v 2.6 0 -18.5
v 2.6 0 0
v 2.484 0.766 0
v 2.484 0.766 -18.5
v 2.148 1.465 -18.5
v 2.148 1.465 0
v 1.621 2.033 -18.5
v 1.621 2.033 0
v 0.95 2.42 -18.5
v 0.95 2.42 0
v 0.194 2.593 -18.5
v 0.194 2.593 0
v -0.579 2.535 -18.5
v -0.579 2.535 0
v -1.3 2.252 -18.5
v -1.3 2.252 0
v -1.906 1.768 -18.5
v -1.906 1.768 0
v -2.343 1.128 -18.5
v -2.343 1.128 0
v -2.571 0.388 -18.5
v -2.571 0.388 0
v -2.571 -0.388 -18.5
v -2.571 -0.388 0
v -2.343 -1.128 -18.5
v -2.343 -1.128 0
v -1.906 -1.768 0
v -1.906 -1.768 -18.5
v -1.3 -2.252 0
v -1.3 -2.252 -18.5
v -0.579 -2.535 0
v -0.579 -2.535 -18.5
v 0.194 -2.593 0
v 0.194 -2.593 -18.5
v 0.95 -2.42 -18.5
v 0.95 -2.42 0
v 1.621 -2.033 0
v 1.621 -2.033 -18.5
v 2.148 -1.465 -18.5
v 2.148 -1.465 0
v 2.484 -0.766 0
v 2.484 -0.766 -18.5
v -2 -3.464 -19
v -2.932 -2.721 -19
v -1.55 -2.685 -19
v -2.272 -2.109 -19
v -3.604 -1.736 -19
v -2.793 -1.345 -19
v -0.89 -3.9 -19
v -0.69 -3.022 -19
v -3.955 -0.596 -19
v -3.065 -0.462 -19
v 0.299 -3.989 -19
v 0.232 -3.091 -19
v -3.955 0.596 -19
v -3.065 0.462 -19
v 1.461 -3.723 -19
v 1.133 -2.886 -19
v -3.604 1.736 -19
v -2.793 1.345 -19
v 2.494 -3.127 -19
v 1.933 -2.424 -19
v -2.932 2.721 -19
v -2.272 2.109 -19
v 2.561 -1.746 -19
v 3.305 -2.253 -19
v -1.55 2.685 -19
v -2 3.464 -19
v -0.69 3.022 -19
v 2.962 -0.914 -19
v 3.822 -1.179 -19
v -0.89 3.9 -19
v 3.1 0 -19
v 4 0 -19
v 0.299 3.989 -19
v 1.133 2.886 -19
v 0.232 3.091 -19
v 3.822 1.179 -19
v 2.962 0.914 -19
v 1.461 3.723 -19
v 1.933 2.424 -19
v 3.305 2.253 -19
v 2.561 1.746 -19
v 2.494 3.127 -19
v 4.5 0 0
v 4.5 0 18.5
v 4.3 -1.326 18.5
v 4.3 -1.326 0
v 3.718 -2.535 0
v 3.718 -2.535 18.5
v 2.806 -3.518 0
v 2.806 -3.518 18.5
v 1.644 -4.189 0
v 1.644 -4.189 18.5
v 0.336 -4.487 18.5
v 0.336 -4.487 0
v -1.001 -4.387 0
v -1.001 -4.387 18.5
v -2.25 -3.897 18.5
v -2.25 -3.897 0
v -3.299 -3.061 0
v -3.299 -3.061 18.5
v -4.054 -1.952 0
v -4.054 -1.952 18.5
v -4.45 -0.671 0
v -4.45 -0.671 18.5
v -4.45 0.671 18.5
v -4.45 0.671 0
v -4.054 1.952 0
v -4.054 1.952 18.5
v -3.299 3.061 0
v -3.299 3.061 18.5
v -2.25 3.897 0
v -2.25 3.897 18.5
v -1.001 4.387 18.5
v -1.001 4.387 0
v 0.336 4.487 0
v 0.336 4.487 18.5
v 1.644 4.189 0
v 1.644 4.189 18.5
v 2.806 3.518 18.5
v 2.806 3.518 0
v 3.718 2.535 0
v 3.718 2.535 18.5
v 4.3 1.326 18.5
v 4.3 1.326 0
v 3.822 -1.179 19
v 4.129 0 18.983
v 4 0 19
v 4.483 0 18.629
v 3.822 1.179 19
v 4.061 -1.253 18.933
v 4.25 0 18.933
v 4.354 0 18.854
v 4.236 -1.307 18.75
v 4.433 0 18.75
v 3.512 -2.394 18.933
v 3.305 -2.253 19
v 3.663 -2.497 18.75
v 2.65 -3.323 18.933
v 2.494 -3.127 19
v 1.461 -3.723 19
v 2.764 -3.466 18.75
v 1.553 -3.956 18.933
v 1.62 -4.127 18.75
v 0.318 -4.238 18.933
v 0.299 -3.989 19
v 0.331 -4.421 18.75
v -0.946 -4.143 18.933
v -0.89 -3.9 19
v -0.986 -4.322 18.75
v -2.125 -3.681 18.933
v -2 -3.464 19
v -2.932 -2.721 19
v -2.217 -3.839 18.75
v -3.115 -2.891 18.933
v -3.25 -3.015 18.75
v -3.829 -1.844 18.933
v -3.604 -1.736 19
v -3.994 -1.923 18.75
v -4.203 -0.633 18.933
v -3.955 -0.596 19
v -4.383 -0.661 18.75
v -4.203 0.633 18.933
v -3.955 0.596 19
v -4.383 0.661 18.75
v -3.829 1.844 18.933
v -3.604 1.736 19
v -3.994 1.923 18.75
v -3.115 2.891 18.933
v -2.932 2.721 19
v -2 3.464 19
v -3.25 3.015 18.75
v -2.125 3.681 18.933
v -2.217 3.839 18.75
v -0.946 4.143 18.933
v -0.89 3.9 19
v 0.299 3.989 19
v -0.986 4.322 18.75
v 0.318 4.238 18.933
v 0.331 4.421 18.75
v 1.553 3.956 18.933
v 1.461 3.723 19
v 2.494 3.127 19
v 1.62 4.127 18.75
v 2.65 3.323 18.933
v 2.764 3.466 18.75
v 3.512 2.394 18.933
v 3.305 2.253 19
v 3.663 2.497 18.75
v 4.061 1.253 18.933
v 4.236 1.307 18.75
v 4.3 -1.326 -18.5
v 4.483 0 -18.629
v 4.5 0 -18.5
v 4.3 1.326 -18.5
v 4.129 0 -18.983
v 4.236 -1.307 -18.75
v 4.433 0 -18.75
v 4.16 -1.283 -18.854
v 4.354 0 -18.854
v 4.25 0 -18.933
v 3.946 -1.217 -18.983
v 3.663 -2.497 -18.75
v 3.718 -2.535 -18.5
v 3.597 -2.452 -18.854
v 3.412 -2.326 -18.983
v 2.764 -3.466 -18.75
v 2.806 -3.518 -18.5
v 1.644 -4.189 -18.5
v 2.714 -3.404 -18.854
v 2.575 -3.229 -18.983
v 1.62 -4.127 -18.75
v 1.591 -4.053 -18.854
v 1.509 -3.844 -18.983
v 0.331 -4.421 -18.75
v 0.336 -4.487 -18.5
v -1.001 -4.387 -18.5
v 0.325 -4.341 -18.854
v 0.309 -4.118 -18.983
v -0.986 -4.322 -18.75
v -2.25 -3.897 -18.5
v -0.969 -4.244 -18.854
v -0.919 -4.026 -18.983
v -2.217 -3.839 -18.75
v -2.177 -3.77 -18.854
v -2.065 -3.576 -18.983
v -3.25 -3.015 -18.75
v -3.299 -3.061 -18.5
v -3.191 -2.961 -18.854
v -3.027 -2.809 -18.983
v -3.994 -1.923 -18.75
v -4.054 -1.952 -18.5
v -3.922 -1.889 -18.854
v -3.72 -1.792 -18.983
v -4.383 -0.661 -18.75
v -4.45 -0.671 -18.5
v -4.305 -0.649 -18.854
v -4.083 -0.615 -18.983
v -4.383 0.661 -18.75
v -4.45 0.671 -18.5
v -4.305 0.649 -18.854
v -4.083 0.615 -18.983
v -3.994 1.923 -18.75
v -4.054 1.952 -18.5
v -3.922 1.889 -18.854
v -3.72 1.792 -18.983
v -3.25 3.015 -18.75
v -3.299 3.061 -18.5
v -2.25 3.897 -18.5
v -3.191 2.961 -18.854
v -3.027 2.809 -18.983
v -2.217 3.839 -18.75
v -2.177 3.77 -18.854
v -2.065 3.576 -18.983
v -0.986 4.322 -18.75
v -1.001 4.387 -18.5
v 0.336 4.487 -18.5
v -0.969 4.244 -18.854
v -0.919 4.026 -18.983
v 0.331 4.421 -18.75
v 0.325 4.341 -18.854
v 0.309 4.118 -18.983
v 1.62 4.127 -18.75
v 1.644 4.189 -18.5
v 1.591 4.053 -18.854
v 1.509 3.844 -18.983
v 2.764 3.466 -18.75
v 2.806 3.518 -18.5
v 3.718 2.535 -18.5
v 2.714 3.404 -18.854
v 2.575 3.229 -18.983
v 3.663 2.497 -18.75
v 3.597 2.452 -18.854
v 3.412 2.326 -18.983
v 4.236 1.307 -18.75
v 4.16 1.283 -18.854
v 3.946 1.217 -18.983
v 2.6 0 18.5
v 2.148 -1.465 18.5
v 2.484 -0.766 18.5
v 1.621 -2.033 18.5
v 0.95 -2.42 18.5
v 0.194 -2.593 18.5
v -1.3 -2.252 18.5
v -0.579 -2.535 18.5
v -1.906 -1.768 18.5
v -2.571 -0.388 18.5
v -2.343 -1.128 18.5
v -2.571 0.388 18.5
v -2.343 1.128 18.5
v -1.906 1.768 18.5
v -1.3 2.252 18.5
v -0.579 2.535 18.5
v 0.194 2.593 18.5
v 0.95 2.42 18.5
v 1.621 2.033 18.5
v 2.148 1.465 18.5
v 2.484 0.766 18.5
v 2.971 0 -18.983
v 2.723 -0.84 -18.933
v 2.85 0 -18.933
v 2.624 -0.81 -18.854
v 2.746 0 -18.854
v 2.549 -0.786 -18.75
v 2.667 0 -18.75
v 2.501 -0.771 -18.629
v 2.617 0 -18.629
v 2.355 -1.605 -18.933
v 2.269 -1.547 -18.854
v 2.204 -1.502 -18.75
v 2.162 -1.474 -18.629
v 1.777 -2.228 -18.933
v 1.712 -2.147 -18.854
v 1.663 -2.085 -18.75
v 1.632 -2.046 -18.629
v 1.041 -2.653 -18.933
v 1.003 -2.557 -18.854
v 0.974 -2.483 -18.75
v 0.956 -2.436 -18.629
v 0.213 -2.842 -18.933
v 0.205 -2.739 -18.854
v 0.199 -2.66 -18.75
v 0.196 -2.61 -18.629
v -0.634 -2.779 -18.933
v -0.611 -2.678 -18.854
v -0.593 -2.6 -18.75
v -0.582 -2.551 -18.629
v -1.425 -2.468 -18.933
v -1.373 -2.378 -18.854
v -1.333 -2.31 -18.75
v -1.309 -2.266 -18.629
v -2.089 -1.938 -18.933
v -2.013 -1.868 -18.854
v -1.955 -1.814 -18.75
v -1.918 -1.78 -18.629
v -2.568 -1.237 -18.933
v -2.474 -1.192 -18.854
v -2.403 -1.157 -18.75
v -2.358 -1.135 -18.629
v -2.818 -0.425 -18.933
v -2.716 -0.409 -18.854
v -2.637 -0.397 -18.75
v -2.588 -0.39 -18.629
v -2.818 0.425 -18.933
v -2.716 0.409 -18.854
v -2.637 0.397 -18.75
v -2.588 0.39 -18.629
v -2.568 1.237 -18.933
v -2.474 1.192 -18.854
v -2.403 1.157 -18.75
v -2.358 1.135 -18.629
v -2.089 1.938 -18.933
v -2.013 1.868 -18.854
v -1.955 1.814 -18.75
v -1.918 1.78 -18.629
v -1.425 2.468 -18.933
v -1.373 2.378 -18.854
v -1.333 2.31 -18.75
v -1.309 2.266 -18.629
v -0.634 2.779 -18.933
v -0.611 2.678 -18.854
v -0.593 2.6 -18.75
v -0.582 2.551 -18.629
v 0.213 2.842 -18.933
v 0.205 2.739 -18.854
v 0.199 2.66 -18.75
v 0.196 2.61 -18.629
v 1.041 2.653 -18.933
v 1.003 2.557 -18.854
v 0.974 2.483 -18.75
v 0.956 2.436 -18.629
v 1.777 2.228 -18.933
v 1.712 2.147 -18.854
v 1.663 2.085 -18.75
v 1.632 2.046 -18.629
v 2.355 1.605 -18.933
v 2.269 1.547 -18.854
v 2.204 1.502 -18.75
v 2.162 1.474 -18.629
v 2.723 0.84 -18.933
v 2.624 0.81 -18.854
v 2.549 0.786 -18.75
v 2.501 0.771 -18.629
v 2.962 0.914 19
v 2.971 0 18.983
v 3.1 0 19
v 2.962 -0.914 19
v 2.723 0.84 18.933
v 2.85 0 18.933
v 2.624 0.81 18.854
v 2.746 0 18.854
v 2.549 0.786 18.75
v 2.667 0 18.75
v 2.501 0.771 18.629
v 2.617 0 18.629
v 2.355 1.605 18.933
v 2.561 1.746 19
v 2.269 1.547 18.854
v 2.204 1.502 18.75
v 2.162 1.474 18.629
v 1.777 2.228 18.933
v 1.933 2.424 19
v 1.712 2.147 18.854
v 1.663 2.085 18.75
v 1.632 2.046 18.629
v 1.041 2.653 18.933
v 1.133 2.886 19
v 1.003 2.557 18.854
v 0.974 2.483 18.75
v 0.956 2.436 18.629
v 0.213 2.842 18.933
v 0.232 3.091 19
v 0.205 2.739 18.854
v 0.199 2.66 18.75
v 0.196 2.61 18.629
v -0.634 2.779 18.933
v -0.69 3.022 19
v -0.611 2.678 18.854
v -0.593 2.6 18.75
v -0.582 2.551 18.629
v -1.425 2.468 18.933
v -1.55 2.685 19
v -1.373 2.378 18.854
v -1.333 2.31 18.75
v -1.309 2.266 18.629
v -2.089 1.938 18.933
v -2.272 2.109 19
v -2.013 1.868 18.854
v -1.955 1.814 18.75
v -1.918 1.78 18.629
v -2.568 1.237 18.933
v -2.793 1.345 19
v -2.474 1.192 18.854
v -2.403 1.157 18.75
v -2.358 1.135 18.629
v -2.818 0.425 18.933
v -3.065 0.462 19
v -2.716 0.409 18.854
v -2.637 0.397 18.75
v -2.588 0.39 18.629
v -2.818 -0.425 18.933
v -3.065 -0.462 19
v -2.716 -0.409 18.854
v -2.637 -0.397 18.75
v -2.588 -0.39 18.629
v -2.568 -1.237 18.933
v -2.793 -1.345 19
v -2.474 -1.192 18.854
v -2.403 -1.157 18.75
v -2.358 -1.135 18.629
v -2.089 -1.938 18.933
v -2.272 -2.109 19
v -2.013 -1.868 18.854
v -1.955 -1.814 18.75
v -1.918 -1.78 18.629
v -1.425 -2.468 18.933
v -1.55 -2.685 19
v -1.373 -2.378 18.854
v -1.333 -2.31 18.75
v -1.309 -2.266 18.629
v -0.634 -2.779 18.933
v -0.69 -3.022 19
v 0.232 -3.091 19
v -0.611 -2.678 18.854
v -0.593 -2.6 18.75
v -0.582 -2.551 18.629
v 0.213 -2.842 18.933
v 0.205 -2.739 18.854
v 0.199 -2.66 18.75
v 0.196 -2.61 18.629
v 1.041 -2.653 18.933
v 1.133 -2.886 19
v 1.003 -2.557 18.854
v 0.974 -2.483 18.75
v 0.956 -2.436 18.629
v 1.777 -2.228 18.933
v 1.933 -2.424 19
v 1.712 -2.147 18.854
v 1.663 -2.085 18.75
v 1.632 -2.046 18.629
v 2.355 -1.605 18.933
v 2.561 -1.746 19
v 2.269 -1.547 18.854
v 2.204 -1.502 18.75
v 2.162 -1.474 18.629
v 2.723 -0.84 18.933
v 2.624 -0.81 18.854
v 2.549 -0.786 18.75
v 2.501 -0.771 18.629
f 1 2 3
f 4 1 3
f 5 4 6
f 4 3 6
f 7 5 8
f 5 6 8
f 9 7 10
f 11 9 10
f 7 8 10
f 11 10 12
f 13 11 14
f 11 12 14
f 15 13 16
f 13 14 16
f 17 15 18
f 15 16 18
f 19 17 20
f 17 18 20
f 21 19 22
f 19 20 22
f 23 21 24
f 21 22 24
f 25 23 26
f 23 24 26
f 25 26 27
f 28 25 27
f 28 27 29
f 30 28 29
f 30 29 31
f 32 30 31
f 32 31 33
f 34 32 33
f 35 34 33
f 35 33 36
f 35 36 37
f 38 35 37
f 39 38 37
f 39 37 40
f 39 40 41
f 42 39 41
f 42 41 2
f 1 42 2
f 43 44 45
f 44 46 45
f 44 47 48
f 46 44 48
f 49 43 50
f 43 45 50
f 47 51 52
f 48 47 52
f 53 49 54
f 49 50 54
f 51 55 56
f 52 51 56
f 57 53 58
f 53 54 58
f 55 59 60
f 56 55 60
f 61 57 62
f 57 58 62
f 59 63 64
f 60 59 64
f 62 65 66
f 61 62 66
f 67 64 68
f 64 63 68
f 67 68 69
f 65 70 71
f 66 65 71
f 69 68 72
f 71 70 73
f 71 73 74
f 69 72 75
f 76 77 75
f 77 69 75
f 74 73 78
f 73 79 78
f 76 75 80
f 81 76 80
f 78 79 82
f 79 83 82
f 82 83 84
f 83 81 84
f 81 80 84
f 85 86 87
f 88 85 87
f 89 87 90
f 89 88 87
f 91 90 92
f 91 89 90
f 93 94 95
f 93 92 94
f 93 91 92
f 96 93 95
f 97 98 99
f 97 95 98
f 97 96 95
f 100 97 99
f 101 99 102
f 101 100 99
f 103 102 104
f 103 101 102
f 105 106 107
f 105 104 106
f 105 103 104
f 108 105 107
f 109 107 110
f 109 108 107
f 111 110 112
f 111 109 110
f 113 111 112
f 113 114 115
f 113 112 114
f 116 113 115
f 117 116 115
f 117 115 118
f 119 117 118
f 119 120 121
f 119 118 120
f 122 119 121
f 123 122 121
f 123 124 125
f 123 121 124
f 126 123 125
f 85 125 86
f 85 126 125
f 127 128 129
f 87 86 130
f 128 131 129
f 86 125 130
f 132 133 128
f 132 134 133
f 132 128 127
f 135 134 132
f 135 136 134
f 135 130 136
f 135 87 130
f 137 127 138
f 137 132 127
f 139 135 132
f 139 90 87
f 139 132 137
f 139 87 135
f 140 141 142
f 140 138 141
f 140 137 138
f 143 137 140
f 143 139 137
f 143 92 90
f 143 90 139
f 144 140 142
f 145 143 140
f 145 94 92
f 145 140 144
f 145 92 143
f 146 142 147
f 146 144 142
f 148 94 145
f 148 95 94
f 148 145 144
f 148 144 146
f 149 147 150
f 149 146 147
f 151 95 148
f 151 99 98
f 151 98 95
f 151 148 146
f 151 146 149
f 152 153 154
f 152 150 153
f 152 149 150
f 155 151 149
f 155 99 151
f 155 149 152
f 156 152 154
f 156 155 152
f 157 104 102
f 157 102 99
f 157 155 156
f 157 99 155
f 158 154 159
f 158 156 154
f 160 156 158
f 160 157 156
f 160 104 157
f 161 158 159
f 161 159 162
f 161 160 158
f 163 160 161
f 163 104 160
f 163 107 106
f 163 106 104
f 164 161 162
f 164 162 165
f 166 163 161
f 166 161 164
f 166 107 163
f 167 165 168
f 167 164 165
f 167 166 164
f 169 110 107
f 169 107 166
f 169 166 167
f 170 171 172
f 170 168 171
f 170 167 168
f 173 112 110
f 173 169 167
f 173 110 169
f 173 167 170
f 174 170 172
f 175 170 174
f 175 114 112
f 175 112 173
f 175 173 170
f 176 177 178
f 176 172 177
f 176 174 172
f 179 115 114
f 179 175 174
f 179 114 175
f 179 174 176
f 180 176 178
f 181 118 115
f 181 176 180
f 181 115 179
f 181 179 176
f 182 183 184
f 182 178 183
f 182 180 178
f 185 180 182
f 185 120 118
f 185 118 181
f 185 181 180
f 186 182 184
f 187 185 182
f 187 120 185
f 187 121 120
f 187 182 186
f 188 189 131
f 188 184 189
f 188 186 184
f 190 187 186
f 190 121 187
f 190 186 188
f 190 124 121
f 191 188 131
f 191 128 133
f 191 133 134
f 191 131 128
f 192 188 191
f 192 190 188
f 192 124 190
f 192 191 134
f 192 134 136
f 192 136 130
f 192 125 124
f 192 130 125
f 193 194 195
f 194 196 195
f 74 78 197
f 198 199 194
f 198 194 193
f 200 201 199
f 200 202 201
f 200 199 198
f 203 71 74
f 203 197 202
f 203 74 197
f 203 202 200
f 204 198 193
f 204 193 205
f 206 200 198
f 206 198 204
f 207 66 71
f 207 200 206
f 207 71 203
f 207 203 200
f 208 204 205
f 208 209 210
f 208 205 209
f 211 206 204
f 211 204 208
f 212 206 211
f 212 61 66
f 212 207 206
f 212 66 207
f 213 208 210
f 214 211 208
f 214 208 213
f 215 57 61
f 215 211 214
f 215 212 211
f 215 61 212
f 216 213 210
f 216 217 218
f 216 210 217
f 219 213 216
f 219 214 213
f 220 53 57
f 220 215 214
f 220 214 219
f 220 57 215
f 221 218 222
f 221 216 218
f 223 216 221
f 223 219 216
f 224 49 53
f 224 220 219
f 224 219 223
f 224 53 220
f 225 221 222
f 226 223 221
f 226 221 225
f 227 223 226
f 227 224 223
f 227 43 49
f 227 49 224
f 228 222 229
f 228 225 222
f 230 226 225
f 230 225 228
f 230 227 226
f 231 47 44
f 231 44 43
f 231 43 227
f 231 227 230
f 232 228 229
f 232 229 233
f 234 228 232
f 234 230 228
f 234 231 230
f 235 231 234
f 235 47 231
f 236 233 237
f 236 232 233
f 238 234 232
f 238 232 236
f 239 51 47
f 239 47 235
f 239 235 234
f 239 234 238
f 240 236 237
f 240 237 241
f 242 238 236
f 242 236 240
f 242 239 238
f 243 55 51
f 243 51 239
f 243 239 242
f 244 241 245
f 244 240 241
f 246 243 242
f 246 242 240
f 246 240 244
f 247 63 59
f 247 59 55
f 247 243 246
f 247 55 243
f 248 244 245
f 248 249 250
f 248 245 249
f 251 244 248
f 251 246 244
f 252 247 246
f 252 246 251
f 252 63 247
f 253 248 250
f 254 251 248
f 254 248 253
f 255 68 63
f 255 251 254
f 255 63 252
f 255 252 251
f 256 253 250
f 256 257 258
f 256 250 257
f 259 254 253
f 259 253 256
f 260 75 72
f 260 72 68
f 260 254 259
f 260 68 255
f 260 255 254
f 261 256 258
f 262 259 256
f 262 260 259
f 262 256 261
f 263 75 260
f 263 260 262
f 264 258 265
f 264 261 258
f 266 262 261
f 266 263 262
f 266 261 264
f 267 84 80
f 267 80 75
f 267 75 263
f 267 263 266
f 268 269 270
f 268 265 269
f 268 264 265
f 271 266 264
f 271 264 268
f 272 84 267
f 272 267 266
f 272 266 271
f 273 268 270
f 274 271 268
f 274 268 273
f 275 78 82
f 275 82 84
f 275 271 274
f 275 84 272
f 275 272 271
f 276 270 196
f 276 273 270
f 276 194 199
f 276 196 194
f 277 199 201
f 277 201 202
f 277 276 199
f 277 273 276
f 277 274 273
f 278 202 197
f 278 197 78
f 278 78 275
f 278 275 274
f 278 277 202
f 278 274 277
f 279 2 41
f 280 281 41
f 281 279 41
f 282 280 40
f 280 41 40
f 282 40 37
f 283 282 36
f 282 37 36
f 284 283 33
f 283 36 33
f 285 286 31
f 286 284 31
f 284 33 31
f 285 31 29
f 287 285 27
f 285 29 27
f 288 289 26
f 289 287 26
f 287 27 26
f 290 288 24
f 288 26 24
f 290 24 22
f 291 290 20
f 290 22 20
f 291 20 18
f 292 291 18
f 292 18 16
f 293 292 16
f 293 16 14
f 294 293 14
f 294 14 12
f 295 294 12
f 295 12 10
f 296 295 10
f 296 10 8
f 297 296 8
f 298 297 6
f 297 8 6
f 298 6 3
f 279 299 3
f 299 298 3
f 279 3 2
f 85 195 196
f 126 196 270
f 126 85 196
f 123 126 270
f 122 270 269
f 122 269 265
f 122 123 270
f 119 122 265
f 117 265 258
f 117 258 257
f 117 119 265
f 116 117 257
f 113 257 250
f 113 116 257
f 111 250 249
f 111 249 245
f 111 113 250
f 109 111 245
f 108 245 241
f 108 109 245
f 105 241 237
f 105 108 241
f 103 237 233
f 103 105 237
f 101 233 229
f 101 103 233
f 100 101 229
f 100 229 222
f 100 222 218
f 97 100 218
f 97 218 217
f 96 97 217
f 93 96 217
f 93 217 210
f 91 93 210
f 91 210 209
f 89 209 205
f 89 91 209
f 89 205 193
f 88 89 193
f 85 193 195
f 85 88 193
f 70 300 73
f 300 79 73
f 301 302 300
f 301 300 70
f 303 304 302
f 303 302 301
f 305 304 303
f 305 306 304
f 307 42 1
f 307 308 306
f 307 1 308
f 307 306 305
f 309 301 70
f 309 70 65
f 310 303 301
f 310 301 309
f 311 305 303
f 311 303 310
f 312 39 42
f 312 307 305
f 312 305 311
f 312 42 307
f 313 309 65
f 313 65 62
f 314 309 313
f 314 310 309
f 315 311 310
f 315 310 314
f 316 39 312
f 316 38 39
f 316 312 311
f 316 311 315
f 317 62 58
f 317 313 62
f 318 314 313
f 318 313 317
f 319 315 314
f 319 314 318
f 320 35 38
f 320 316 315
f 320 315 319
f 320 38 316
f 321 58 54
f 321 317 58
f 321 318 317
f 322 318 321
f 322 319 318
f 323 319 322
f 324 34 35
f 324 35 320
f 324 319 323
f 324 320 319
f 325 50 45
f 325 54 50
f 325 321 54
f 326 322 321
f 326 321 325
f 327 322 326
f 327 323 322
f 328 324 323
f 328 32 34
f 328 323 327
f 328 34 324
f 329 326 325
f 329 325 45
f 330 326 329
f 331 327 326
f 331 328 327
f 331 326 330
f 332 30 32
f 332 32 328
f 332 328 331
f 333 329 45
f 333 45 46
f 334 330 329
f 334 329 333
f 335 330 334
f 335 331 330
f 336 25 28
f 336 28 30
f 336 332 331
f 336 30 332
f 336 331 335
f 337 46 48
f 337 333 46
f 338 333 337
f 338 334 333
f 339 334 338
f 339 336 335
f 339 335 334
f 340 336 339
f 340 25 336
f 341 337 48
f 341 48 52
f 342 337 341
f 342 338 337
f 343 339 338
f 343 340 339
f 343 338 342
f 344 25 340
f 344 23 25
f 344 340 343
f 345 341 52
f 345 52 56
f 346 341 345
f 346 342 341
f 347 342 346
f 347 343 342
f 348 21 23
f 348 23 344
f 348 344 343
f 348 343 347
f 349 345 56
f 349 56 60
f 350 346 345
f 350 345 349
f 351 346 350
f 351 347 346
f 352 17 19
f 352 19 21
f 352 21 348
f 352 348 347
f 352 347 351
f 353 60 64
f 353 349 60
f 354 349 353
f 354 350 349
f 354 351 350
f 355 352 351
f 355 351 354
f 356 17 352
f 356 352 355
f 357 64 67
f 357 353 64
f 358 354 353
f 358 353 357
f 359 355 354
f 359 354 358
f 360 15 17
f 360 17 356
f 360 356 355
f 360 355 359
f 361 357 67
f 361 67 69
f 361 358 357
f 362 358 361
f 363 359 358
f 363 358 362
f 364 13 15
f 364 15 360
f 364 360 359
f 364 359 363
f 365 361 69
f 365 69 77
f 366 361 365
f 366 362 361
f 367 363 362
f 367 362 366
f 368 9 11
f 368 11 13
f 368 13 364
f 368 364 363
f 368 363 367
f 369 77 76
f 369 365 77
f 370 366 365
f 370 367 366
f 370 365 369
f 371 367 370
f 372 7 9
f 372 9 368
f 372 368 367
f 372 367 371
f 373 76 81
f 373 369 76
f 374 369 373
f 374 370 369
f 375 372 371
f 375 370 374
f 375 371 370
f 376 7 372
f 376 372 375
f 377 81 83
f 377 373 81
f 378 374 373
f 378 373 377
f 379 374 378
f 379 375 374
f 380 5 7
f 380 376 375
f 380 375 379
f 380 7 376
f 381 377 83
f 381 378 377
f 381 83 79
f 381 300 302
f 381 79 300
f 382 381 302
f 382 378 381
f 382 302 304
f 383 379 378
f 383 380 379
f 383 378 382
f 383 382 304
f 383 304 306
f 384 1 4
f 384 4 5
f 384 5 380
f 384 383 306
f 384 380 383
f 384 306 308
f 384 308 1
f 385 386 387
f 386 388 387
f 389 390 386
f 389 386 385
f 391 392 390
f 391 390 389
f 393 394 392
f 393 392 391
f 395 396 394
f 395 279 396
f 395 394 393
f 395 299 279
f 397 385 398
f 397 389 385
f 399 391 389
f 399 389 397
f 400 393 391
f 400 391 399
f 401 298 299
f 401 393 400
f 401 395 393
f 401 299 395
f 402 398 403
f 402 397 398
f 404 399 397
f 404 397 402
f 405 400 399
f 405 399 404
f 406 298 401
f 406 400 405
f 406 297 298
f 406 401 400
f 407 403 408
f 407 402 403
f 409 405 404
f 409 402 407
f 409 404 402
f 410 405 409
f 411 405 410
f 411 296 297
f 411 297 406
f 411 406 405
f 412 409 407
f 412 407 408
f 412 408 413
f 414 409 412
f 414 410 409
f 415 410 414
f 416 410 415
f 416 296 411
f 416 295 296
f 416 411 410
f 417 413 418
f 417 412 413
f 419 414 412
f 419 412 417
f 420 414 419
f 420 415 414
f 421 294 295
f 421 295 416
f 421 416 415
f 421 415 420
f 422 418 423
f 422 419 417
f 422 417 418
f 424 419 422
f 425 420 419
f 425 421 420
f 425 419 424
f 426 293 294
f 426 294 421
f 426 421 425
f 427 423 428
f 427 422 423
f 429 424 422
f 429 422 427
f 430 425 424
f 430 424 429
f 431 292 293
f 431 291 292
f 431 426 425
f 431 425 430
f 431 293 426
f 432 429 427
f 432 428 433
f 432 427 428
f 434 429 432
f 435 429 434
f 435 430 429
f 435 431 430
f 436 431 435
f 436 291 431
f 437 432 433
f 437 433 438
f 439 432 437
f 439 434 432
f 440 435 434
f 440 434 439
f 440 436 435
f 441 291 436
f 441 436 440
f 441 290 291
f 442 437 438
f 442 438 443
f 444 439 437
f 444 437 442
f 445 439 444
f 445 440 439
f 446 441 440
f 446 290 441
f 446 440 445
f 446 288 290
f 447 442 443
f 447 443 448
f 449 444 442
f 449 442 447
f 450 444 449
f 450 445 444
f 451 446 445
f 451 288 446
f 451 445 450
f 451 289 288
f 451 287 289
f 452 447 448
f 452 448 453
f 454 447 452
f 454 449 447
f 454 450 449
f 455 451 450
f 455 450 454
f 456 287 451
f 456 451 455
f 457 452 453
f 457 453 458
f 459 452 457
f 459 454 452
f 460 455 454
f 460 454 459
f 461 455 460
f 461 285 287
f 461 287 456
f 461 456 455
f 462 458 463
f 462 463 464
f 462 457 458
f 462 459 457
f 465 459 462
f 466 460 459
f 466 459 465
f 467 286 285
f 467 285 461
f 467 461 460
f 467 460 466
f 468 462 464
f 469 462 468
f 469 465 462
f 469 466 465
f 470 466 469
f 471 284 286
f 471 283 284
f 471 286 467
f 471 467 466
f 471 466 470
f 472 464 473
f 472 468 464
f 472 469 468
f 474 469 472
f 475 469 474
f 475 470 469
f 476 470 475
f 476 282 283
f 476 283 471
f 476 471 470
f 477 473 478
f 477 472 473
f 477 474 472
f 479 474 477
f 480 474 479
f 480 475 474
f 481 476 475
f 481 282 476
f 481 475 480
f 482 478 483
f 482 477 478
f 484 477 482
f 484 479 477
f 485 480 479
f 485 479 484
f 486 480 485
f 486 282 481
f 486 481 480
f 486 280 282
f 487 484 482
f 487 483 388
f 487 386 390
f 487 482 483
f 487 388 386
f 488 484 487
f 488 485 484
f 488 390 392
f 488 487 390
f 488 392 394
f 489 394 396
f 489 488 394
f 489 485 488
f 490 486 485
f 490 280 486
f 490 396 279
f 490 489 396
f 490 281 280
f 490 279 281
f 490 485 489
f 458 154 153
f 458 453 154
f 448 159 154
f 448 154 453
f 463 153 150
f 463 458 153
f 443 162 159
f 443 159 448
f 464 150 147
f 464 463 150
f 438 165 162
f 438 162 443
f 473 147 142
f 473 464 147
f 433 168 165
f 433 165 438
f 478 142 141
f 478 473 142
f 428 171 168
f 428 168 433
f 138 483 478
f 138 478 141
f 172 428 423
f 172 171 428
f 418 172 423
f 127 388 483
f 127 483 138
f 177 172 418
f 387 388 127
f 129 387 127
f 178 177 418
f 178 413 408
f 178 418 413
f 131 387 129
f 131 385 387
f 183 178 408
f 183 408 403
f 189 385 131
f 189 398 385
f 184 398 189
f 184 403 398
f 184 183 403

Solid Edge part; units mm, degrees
sketch "Sketch1" plane through (0, 0, 0) normal (0, 0, 1) x (1, 0, 0)
  circle A0 centre (0, 0) radius 4.5
  circle A1 centre (0, 0) radius 2.6
  dimension "D1" = 9
  dimension "D2" = 5.2
extrude "Protrusion1" add sketch "Sketch1" along normal mid plane 38
fillet "Round_1" radius 0.5 2 edges at (-2.6, 0, -19) (-2.6, 0, 19)
fillet "Round_2" radius 0.5 2 edges at (-4.5, 0, -19) (-4.5, 0, 19)
properties material "Acrylic, high impact grade"
